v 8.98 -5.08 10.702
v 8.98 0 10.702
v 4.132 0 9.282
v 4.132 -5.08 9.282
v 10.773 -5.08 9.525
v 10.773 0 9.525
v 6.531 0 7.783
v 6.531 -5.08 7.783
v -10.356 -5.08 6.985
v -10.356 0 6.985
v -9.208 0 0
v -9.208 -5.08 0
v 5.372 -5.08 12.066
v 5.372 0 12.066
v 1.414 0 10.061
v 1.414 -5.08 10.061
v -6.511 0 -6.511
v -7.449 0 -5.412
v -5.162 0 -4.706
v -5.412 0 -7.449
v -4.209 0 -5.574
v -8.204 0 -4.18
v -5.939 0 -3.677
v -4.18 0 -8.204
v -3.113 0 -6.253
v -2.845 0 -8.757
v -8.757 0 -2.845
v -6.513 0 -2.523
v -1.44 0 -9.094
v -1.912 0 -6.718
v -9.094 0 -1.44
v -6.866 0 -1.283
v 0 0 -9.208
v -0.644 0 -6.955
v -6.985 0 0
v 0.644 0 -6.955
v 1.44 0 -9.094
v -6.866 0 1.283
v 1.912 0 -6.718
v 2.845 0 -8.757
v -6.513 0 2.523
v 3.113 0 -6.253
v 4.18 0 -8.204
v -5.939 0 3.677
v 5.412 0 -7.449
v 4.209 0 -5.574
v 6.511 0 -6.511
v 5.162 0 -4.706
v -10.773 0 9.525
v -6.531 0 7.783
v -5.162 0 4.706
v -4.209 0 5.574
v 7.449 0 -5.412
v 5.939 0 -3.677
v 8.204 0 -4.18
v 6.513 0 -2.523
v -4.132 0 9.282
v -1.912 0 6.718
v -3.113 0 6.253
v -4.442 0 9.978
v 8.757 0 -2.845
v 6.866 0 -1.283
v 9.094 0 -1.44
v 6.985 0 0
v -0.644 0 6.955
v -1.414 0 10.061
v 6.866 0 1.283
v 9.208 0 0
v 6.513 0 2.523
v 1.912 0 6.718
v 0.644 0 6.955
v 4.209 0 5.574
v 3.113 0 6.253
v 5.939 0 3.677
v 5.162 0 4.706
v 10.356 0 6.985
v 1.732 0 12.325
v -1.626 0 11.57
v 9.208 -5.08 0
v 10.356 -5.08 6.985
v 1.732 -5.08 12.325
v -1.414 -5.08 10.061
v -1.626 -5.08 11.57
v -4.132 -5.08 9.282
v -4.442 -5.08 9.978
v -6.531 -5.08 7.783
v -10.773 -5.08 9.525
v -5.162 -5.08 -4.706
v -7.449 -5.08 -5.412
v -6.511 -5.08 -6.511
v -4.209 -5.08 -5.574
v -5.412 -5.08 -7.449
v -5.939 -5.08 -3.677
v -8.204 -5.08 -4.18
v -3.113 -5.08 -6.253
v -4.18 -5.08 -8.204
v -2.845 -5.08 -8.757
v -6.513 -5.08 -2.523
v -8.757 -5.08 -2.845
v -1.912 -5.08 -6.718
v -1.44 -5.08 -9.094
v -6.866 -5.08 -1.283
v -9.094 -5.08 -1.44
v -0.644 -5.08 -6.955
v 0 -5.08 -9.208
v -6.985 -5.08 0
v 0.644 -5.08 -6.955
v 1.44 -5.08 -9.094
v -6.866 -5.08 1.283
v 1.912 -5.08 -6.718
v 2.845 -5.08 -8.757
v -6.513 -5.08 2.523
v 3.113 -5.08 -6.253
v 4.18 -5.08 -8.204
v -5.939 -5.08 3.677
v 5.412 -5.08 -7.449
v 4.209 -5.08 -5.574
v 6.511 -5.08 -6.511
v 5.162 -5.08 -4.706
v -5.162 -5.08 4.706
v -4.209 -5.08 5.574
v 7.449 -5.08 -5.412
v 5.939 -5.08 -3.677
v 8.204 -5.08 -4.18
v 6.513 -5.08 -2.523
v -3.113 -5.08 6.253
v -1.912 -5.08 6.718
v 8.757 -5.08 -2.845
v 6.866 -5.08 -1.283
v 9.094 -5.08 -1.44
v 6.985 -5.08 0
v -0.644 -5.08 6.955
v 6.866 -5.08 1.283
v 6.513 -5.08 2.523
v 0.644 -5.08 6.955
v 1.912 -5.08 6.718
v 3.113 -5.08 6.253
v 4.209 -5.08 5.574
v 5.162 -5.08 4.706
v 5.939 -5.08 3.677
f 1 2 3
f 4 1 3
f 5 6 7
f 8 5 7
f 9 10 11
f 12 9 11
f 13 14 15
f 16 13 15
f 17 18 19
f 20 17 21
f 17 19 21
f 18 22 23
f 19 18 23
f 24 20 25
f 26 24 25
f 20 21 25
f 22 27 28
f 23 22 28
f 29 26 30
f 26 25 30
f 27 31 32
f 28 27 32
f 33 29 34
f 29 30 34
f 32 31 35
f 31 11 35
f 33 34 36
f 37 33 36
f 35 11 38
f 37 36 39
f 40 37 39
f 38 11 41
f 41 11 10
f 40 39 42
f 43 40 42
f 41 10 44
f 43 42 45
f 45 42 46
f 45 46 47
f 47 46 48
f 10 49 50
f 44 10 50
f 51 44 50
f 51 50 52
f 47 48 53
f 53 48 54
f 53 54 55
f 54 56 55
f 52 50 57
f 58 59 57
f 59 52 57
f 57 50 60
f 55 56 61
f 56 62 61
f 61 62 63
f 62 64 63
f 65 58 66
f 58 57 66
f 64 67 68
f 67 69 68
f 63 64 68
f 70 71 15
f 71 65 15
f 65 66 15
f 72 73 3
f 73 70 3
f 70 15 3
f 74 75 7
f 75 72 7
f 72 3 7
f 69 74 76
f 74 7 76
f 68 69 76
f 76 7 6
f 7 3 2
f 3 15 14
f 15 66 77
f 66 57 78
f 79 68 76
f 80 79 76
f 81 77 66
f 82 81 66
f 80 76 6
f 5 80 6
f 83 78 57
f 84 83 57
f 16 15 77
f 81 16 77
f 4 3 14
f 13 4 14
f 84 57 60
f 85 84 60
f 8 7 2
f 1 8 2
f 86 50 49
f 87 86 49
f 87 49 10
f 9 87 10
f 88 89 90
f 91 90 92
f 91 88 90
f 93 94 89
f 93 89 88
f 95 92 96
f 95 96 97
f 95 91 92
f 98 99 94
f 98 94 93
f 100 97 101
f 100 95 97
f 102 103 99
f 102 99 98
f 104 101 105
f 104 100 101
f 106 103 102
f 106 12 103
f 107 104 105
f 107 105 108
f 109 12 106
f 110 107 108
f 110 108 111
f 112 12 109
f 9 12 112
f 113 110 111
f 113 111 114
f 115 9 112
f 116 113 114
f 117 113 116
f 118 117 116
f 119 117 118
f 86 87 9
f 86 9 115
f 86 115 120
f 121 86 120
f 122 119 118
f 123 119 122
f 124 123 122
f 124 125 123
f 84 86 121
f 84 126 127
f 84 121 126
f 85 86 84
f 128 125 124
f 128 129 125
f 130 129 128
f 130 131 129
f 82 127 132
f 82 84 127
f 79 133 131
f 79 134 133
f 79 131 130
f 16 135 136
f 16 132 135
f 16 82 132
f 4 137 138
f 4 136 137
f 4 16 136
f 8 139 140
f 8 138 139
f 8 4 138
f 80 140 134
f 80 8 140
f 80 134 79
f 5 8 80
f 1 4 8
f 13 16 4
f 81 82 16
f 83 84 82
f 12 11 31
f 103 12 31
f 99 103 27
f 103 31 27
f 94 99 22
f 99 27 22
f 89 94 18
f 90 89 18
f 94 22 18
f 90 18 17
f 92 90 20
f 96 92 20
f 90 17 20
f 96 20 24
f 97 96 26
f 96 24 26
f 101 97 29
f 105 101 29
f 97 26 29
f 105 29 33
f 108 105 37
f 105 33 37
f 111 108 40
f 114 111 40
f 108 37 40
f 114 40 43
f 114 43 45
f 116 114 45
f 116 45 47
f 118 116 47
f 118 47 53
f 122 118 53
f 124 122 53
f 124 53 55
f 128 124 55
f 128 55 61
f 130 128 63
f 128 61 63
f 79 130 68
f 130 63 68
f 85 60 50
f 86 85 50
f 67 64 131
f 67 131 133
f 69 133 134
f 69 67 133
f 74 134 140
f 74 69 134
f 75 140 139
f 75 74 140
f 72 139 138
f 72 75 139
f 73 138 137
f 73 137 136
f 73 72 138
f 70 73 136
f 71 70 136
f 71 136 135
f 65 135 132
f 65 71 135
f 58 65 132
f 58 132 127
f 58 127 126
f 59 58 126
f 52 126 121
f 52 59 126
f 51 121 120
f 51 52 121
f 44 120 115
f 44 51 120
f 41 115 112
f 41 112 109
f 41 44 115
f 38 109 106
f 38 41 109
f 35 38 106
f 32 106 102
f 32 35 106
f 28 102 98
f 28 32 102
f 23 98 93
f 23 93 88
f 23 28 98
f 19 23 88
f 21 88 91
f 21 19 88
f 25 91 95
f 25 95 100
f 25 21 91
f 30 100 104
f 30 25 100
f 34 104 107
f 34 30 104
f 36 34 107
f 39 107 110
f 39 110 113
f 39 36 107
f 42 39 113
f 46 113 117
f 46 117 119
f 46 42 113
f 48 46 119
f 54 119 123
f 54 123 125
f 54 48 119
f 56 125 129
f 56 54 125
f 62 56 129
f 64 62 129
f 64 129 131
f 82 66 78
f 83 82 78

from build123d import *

# Parameters (mm, degrees)
F0_R     = 6.985
F1_DEPTH = 5.08


with BuildPart() as f1:
    # F0 (on Front) → F1 (new body)
    with BuildSketch(Plane.XZ):
        with BuildLine():
            ThreePointArc((-9.2075, 0), (0, 9.2075), (9.2075, 0))
            Line((9.2075, 0), (10.355688, 6.985))
            Line((10.355688, 6.985), (10.773211, 9.525))
            Line((10.773211, 9.525), (6.530722, 7.783012))
            Line((6.530722, 7.783012), (8.979743, 10.701641))
            Line((8.979743, 10.701641), (4.132444, 9.281622))
            Line((4.132444, 9.281622), (5.372178, 12.066108))
            Line((5.372178, 12.066108), (1.413999, 10.061124))
            Line((1.413999, 10.061124), (1.732148, 12.324876))
            Line((1.732148, 12.324876), (-1.413999, 10.061124))
            Line((-1.413999, 10.061124), (-1.626099, 11.570292))
            Line((-1.626099, 11.570292), (-4.132444, 9.281622))
            Line((-4.132444, 9.281622), (-4.442378, 9.977743))
            Line((-4.442378, 9.977743), (-6.530722, 7.783012))
            Line((-6.530722, 7.783012), (-10.773211, 9.525))
            Line((-10.773211, 9.525), (-10.355688, 6.985))
            Line((-10.355688, 6.985), (-9.2075, 0))
        make_face()
        with BuildLine():
            ThreePointArc((-9.2075, 0), (0, -9.2075), (9.2075, 0))
            ThreePointArc((9.2075, 0), (0, 9.2075), (-9.2075, 0))
        make_face()
        Circle(F0_R, mode=Mode.SUBTRACT)
    extrude(amount=F1_DEPTH)


solid = f1.part
